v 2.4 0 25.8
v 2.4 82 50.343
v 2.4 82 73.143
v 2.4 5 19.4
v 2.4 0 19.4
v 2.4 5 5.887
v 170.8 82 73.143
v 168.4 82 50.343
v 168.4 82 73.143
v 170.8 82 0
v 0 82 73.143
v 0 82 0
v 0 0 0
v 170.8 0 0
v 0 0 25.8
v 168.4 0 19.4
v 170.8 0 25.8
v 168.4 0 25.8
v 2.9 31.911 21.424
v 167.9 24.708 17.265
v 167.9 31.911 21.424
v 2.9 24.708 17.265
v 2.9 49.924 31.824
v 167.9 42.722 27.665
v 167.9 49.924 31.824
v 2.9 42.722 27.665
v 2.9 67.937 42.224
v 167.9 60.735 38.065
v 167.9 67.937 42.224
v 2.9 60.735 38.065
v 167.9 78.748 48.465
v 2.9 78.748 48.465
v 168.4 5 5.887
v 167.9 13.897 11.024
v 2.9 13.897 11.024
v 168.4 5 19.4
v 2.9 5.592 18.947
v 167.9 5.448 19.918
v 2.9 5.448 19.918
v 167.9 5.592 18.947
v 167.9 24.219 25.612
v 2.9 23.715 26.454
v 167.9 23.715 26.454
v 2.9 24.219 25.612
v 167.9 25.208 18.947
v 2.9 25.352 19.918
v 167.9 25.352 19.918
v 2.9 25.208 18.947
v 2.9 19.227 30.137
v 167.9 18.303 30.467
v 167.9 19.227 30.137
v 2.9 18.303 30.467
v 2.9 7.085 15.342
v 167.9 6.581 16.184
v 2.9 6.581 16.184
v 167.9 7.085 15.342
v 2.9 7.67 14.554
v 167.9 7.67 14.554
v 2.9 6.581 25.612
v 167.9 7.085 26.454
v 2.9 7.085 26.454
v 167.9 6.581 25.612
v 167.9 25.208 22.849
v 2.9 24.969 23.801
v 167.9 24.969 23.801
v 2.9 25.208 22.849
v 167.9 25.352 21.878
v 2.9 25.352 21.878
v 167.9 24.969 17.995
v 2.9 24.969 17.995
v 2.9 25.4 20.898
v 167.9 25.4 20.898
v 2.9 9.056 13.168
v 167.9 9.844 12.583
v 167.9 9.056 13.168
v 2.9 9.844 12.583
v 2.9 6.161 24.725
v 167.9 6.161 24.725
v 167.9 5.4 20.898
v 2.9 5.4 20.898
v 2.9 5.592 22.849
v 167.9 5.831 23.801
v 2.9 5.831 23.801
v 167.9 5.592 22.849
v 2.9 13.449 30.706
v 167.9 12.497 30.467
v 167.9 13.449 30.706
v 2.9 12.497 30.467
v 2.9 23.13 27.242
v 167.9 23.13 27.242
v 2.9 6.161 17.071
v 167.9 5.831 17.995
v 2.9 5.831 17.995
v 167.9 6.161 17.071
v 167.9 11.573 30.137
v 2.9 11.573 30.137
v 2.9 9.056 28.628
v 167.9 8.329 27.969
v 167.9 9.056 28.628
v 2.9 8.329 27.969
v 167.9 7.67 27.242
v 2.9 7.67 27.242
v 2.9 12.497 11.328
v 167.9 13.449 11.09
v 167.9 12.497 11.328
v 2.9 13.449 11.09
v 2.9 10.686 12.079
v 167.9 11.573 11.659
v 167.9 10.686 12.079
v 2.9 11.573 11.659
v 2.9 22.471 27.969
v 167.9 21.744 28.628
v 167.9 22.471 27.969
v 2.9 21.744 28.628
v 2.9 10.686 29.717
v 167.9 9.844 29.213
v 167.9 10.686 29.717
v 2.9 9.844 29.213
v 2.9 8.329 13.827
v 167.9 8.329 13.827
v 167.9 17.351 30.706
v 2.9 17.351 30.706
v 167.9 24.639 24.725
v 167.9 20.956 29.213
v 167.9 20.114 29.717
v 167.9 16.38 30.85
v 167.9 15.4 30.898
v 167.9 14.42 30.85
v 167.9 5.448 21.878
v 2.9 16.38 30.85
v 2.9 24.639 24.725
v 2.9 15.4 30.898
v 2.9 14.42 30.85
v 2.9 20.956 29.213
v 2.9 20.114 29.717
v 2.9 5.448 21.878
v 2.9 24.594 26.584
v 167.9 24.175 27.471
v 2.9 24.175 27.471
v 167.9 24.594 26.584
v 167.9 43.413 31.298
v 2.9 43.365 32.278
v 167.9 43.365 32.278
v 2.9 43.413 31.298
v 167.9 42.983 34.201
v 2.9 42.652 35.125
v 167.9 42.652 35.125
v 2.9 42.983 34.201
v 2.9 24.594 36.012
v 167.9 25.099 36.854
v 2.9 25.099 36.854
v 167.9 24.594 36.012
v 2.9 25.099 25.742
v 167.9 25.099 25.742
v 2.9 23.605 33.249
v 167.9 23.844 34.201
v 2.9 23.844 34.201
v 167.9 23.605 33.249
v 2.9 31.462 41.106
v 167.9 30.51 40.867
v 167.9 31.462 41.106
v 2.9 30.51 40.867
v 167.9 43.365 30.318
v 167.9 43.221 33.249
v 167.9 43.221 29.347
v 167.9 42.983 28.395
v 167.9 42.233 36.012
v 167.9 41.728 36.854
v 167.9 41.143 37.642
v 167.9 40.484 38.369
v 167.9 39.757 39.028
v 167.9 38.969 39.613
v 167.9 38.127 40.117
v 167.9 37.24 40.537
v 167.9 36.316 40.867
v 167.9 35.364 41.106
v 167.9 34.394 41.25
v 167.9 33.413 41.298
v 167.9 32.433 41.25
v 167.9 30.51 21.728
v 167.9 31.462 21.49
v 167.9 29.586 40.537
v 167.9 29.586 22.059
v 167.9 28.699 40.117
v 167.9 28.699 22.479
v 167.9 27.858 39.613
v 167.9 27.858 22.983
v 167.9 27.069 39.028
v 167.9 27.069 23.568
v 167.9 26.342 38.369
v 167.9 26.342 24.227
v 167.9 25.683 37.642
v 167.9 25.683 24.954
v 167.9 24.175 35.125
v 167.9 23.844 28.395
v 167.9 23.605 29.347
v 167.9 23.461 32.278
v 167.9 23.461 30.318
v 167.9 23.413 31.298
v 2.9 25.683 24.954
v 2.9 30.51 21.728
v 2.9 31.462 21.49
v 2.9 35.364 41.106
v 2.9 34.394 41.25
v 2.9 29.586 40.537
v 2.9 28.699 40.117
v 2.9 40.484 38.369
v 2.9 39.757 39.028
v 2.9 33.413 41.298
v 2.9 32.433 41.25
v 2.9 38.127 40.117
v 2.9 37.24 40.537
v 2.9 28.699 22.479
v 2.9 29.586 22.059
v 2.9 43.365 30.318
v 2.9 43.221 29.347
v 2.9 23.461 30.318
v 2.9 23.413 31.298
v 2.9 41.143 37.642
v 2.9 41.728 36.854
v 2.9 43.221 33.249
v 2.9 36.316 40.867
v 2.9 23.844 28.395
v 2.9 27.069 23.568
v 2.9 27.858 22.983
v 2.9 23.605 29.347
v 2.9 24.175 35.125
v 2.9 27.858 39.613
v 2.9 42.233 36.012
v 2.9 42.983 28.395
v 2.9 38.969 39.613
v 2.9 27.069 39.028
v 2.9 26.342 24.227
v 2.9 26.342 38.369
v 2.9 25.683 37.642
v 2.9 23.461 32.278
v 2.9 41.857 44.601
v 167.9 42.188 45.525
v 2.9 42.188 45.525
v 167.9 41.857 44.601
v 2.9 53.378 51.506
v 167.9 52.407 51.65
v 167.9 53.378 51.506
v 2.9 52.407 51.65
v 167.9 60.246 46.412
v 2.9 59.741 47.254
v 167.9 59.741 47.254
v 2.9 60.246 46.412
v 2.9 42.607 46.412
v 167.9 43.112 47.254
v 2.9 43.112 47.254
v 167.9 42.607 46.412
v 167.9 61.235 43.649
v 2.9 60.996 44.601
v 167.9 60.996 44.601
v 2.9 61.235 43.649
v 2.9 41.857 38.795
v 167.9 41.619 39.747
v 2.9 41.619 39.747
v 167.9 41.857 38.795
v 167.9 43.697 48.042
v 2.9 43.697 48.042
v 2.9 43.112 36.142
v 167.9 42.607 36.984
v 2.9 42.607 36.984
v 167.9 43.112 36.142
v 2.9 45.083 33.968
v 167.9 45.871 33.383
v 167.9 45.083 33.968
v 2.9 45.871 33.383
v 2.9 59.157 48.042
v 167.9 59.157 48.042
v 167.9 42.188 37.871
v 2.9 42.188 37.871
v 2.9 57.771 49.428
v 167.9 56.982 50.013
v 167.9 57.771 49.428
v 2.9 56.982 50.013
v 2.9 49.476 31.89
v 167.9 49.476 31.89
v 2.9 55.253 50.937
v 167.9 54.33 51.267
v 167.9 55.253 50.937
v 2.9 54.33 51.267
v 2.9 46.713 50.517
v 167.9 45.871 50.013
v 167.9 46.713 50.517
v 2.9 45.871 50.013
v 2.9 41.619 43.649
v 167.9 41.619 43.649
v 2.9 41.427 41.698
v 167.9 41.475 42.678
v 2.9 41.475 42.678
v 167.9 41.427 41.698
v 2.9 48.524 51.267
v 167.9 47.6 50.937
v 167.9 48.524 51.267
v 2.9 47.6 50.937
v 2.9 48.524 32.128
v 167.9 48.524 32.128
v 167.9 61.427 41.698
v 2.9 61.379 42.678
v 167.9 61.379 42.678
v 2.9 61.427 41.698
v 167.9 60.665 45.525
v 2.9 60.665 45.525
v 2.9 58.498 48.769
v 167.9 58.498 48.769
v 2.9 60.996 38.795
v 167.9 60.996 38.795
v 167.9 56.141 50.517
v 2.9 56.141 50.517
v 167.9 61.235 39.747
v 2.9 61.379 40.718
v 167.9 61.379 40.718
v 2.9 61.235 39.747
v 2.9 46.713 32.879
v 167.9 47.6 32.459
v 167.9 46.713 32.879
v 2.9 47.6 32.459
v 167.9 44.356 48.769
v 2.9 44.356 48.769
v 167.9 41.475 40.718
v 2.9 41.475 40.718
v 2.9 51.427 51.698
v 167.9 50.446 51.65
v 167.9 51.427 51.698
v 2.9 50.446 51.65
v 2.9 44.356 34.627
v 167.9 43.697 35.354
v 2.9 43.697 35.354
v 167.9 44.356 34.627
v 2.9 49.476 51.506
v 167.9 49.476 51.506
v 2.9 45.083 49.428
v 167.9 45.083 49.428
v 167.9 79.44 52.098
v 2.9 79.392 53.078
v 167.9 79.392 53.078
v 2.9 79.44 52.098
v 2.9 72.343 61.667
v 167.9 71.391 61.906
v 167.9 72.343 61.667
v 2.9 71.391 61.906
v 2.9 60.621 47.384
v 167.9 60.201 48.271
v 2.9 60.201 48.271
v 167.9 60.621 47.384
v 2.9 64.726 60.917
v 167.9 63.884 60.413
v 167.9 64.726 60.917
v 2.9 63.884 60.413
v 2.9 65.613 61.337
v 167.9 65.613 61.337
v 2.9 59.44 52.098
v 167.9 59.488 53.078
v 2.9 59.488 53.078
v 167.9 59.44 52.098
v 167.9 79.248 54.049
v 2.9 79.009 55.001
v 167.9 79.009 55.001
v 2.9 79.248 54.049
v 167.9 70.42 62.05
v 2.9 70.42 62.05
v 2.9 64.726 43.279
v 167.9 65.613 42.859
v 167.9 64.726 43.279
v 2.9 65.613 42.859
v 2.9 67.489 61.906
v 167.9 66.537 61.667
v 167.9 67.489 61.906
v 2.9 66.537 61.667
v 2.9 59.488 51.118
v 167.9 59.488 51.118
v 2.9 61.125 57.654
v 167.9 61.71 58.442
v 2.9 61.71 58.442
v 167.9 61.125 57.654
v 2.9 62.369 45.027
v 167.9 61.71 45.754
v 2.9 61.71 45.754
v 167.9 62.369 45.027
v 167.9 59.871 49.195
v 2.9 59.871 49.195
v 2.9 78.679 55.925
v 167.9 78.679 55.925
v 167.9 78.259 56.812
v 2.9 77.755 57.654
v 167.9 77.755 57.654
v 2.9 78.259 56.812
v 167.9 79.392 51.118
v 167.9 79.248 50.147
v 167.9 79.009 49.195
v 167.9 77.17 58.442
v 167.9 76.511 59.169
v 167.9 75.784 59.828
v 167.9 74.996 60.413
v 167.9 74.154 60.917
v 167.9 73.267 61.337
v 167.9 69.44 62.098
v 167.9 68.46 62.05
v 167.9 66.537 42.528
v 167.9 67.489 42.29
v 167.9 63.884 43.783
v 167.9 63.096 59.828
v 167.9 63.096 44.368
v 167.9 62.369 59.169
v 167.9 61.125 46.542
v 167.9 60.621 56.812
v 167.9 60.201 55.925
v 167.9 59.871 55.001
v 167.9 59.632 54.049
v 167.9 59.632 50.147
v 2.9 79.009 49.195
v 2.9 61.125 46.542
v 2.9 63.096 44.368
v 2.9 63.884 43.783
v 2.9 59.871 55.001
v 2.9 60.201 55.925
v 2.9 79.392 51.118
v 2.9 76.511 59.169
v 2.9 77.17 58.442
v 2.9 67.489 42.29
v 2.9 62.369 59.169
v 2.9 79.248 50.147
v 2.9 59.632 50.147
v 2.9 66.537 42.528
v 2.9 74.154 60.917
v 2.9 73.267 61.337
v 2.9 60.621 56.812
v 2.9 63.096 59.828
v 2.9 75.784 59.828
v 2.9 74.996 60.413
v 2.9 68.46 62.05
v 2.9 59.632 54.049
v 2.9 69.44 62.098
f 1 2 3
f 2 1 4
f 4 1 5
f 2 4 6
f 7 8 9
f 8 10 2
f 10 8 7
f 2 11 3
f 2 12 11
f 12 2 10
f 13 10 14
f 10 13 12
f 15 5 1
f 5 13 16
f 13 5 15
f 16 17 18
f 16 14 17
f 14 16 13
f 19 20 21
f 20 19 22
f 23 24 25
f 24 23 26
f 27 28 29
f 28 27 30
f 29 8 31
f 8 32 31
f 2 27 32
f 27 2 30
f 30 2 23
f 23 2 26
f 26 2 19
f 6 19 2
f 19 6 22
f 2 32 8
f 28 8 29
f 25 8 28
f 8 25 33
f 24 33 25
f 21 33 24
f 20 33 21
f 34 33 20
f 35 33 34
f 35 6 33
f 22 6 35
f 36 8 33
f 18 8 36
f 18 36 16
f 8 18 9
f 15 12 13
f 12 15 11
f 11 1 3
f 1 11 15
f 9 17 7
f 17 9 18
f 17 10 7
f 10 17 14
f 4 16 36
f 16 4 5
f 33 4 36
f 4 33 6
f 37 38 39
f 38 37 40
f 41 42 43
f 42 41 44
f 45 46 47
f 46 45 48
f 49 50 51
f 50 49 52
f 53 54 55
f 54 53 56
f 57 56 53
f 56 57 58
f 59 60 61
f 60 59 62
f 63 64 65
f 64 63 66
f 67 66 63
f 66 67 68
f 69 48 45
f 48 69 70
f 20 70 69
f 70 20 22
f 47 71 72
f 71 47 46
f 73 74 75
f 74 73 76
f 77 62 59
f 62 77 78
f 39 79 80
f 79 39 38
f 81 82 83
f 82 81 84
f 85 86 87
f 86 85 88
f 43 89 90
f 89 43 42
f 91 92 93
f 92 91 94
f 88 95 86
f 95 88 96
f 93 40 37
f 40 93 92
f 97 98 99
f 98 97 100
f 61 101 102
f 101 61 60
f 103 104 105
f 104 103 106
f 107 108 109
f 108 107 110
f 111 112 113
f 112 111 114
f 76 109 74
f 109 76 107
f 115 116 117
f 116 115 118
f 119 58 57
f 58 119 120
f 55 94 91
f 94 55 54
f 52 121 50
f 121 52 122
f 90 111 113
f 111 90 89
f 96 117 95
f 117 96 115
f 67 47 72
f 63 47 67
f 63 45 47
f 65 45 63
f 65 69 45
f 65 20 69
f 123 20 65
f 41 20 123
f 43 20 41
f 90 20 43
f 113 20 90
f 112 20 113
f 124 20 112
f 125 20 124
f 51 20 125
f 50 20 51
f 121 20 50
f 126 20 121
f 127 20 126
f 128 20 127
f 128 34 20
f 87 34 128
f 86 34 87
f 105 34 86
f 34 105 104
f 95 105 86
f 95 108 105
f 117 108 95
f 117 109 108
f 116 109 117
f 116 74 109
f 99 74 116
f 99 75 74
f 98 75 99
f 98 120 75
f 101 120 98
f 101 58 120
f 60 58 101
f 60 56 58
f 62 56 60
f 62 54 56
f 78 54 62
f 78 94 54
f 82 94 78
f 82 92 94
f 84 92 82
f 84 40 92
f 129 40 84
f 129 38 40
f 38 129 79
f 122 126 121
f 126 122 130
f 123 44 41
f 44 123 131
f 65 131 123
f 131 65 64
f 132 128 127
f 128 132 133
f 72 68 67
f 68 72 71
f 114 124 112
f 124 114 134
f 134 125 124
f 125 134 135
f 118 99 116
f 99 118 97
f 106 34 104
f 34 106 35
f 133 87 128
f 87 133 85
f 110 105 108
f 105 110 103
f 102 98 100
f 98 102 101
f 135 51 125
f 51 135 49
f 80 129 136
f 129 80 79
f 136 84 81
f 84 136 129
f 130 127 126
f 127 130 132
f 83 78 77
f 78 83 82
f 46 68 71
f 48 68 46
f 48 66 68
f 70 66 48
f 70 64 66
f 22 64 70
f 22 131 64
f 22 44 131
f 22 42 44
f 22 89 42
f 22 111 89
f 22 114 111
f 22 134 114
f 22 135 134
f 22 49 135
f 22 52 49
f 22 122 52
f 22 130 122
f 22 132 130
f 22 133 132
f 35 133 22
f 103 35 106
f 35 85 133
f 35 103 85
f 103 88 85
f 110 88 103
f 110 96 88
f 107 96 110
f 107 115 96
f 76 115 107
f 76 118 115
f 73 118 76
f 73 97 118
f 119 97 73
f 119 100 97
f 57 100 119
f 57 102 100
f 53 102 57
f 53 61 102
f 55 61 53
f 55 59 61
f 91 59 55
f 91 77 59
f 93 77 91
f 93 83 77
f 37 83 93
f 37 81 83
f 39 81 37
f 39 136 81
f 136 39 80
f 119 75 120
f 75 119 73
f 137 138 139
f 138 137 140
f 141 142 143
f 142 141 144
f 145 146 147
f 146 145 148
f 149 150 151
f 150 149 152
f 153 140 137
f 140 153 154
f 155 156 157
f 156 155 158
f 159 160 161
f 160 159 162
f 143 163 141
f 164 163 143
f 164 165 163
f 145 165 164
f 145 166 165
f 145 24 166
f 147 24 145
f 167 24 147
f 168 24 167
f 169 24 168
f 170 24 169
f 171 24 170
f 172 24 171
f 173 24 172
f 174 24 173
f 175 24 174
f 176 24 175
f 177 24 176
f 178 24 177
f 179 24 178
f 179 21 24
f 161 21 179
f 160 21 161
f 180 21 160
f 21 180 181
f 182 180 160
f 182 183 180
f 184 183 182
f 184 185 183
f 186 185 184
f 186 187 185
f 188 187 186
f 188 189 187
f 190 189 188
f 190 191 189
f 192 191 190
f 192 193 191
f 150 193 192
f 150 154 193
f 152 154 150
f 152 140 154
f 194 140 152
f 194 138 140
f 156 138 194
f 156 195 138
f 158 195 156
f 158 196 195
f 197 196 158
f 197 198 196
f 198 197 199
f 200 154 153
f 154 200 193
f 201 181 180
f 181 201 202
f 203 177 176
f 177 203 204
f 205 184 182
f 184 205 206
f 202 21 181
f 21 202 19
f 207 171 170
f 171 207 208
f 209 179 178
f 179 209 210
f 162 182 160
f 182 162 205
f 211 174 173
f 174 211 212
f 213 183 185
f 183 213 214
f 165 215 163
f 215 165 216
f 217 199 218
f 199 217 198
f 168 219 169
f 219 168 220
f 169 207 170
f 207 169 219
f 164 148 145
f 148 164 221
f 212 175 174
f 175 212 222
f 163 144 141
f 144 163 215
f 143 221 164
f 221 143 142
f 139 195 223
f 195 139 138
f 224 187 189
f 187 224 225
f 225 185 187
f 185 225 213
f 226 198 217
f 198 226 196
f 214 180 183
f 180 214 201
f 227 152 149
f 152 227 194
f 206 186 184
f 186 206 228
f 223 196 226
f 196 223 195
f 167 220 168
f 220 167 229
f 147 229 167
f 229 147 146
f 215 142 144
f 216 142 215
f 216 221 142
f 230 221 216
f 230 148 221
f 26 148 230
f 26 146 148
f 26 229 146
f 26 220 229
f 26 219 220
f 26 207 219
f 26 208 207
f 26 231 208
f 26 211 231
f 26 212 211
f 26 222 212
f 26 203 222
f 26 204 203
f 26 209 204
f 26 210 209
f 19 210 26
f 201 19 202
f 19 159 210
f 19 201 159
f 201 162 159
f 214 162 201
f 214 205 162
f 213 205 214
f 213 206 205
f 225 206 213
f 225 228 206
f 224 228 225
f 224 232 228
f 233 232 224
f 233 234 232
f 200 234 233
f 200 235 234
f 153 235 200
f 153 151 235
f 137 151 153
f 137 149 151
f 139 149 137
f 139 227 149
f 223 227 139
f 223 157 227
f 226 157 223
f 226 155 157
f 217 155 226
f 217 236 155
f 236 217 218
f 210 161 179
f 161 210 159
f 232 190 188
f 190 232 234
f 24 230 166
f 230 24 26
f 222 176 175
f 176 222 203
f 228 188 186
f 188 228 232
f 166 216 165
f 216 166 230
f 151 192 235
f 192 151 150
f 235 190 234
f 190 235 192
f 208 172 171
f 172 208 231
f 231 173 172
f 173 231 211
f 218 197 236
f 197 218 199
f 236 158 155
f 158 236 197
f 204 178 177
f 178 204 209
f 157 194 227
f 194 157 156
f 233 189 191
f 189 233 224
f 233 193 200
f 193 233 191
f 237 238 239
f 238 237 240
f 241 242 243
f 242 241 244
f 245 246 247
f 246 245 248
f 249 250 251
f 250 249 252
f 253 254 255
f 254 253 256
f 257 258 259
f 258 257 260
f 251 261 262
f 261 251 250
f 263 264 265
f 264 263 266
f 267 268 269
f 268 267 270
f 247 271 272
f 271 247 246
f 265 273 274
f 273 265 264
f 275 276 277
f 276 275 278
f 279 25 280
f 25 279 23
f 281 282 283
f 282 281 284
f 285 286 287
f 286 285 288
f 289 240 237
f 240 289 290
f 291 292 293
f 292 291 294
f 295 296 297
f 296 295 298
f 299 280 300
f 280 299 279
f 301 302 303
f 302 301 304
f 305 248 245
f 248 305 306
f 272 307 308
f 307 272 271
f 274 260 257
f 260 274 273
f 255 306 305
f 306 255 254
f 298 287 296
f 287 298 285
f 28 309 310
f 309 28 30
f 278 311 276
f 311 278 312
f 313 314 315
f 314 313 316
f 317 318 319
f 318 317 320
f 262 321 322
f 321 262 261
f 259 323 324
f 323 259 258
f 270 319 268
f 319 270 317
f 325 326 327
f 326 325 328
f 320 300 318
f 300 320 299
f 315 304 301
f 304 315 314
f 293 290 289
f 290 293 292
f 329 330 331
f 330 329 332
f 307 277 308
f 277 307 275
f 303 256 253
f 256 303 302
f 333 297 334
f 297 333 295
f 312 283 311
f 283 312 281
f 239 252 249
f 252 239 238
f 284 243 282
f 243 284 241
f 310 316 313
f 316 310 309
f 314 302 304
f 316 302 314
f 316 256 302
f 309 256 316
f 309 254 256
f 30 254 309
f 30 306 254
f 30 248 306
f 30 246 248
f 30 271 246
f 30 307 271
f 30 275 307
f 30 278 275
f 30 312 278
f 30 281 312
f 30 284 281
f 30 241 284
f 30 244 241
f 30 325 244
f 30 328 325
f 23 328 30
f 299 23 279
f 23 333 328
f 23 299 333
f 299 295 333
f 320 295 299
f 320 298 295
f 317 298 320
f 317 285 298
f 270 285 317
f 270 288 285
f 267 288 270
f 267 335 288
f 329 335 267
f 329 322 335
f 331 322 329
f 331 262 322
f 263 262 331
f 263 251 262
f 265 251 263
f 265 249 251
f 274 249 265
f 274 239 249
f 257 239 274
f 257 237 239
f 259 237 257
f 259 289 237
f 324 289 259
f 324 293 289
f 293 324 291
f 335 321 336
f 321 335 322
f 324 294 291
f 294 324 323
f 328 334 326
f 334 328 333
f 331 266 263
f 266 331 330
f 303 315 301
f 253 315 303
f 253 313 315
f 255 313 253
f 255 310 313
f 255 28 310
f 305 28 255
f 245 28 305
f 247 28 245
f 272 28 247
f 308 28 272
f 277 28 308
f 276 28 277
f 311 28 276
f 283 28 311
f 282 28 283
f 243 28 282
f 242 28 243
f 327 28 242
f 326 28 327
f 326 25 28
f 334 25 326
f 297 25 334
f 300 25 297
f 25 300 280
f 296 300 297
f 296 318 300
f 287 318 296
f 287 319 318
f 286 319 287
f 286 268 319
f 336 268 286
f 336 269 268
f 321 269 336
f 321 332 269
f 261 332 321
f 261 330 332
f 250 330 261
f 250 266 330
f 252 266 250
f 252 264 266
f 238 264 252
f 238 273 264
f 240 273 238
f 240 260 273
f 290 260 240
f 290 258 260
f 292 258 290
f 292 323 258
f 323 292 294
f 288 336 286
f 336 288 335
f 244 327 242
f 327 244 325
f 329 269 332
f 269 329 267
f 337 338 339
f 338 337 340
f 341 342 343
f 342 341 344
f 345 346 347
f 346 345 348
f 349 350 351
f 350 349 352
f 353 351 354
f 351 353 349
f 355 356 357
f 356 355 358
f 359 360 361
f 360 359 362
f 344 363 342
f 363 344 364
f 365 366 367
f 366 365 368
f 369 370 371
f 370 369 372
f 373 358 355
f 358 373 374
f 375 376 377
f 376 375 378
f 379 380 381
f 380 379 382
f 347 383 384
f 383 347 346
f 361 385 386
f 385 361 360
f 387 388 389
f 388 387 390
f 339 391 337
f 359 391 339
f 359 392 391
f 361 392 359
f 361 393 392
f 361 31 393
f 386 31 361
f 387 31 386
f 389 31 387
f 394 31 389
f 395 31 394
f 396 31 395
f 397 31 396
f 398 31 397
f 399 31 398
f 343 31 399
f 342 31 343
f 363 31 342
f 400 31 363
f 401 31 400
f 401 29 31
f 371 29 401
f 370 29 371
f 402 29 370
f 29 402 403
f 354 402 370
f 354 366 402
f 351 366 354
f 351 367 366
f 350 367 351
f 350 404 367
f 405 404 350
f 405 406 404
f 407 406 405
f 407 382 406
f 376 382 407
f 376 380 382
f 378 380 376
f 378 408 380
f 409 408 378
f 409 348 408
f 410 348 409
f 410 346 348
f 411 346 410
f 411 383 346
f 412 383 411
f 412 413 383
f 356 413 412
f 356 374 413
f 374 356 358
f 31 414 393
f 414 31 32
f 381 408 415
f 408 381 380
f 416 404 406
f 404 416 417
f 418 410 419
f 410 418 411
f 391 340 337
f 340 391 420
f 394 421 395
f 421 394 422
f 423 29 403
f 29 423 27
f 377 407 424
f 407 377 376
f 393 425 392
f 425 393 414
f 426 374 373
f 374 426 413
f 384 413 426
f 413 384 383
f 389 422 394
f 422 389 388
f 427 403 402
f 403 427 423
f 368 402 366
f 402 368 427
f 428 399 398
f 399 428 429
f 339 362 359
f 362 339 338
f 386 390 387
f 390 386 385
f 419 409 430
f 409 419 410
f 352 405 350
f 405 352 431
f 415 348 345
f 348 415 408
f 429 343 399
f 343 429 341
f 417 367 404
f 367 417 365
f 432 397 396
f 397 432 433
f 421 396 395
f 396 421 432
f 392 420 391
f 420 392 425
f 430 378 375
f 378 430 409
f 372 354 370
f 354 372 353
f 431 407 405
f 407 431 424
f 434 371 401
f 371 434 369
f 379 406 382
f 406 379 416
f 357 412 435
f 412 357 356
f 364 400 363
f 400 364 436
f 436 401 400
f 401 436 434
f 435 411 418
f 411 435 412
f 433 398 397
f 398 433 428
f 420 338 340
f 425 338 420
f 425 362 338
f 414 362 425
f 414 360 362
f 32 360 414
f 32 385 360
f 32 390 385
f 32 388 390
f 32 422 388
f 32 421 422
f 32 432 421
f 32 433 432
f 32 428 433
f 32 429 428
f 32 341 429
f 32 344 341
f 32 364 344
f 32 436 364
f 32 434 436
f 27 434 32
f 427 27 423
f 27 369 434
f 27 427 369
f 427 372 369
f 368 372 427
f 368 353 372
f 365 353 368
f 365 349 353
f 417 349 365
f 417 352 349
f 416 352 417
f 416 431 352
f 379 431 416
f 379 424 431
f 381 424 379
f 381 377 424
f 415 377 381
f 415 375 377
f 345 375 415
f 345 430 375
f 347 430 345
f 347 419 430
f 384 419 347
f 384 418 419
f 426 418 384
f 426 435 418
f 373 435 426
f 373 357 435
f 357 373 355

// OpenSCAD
// file: ../designs/common.scad
// ============================================================
// common.scad — shared parameters + modules for all designs
// LOCKED PEN SPECIFICATION (do not change)
// ============================================================
PEN_L = 165;      // pen length (mm)
PEN_A = 17;       // pen cross-section minor
PEN_B = 20;       // pen cross-section major (used as diameter envelope)
CLEAR = 0.4;      // fit clearance
WALL  = 1.6;      // minimum wall thickness

$fn = 64;

RCH = PEN_B/2 + CLEAR;   // = 10.4  channel radius
EPS = 0.01;

// --- open-top U trough cut, axis along X, centered at local origin -----------
// Removes a lower half-cylinder of radius r plus a full-width vertical slot
// upward, so the channel is open at the top (no ceiling -> no overhang).
module trough_cut(len, r=RCH, top=80) {
    union() {
        rotate([0,90,0]) cylinder(h=len, r=r, center=true);
        translate([0,0,top/2]) cube([len, 2*r, top], center=true); // slot upward
    }
}

// --- teardrop hole, axis along X, centered at local origin --------------------
// 45-degree self-supporting apex pointing +Z so a horizontal bore can print
// without support.
module teardrop_cut(len, r=RCH) {
    rotate([0,90,0])
        linear_extrude(height=len, center=true)
            union() {
                circle(r=r);
                polygon([[ 0.7071*r, 0.7071*r],
                         [ 0,         1.4142*r],
                         [-0.7071*r,  0.7071*r]]);
            }
}

// --- dial relief: widened open-top pocket at one channel end -----------------
// place at the +X or -X end of a channel so the dose dial clears / can be turned
module dial_relief(end_x, r=RCH+2.2, len=28, top=80) {
    translate([end_x, 0, 0]) trough_cut(len, r, top);
}
// file: ../designs/sk2_chute.scad
// sk2_chute — GRAVITY-FEED magazine (Jason's sketch, option #2).
// Drop a pen onto the ramp at the open back/top; it rolls DOWN to the front and
// stacks against the front catch wall (like a fridge can-dispenser). Take the
// front pen out over the lip; the next rolls forward. One open tray, 4 pens
// single-file. Prints support-free (sloped floor is a solid wedge; walls vertical).
include <common.scad>

THETA  = 30;              // ramp angle (gentle, so pens roll without slamming)
LXIN   = PEN_L + 1.0;     // inner length between end walls (pen + clearance)
EW     = 2.4;            // end wall thickness
LX     = LXIN + 2*EW;     // 171.8 outer (X)
BASE   = 3;              // floor thickness at the front
DEPTH  = 82;             // Y depth (~4 pens single-file)
FW     = 5;              // front catch wall thickness
HW     = 2*RCH + 2;      // side wall height above the floor (contains pens)
FLIP   = 6;              // front wall rises this far above the front pen center

t = tan(THETA);
ramp_back = BASE + DEPTH*t;          // floor height at the back
HT = ramp_back + HW;                 // overall height

// floor solid (front face = BASE tall, top = ramp rising to the back)
module floor_solid()
    translate([EW,0,0]) rotate([90,0,90]) linear_extrude(height=LXIN)
        polygon([[0,0],[DEPTH,0],[DEPTH,ramp_back],[0,BASE]]);

// one side wall: follows the ramp, stands HW above the floor
module side_wall()
    rotate([90,0,90]) linear_extrude(height=EW)
        polygon([[0,0],[DEPTH,0],[DEPTH,ramp_back+HW],[0,BASE+HW]]);

union() {
    floor_solid();
    translate([0,0,0])      side_wall();          // -X end wall
    translate([LX-EW,0,0])  side_wall();          // +X end wall
    // front catch wall + lip (retains the front pen)
    cube([LX, FW, BASE + RCH + FLIP]);
}
// main file
include <../designs/sk2_chute.scad>
// 4 pens rolled to the front, stacked against the catch wall
for (i=[0:3]) {
    yc = FW + RCH + i*2*RCH*cos(THETA);
    zc = BASE + yc*t + RCH*cos(THETA);
    color([0.62,0.62,0.64])
        translate([EW+LXIN/2, yc, zc]) rotate([0,90,0])
            cylinder(h=PEN_L, r=PEN_B/2, center=true);
}
